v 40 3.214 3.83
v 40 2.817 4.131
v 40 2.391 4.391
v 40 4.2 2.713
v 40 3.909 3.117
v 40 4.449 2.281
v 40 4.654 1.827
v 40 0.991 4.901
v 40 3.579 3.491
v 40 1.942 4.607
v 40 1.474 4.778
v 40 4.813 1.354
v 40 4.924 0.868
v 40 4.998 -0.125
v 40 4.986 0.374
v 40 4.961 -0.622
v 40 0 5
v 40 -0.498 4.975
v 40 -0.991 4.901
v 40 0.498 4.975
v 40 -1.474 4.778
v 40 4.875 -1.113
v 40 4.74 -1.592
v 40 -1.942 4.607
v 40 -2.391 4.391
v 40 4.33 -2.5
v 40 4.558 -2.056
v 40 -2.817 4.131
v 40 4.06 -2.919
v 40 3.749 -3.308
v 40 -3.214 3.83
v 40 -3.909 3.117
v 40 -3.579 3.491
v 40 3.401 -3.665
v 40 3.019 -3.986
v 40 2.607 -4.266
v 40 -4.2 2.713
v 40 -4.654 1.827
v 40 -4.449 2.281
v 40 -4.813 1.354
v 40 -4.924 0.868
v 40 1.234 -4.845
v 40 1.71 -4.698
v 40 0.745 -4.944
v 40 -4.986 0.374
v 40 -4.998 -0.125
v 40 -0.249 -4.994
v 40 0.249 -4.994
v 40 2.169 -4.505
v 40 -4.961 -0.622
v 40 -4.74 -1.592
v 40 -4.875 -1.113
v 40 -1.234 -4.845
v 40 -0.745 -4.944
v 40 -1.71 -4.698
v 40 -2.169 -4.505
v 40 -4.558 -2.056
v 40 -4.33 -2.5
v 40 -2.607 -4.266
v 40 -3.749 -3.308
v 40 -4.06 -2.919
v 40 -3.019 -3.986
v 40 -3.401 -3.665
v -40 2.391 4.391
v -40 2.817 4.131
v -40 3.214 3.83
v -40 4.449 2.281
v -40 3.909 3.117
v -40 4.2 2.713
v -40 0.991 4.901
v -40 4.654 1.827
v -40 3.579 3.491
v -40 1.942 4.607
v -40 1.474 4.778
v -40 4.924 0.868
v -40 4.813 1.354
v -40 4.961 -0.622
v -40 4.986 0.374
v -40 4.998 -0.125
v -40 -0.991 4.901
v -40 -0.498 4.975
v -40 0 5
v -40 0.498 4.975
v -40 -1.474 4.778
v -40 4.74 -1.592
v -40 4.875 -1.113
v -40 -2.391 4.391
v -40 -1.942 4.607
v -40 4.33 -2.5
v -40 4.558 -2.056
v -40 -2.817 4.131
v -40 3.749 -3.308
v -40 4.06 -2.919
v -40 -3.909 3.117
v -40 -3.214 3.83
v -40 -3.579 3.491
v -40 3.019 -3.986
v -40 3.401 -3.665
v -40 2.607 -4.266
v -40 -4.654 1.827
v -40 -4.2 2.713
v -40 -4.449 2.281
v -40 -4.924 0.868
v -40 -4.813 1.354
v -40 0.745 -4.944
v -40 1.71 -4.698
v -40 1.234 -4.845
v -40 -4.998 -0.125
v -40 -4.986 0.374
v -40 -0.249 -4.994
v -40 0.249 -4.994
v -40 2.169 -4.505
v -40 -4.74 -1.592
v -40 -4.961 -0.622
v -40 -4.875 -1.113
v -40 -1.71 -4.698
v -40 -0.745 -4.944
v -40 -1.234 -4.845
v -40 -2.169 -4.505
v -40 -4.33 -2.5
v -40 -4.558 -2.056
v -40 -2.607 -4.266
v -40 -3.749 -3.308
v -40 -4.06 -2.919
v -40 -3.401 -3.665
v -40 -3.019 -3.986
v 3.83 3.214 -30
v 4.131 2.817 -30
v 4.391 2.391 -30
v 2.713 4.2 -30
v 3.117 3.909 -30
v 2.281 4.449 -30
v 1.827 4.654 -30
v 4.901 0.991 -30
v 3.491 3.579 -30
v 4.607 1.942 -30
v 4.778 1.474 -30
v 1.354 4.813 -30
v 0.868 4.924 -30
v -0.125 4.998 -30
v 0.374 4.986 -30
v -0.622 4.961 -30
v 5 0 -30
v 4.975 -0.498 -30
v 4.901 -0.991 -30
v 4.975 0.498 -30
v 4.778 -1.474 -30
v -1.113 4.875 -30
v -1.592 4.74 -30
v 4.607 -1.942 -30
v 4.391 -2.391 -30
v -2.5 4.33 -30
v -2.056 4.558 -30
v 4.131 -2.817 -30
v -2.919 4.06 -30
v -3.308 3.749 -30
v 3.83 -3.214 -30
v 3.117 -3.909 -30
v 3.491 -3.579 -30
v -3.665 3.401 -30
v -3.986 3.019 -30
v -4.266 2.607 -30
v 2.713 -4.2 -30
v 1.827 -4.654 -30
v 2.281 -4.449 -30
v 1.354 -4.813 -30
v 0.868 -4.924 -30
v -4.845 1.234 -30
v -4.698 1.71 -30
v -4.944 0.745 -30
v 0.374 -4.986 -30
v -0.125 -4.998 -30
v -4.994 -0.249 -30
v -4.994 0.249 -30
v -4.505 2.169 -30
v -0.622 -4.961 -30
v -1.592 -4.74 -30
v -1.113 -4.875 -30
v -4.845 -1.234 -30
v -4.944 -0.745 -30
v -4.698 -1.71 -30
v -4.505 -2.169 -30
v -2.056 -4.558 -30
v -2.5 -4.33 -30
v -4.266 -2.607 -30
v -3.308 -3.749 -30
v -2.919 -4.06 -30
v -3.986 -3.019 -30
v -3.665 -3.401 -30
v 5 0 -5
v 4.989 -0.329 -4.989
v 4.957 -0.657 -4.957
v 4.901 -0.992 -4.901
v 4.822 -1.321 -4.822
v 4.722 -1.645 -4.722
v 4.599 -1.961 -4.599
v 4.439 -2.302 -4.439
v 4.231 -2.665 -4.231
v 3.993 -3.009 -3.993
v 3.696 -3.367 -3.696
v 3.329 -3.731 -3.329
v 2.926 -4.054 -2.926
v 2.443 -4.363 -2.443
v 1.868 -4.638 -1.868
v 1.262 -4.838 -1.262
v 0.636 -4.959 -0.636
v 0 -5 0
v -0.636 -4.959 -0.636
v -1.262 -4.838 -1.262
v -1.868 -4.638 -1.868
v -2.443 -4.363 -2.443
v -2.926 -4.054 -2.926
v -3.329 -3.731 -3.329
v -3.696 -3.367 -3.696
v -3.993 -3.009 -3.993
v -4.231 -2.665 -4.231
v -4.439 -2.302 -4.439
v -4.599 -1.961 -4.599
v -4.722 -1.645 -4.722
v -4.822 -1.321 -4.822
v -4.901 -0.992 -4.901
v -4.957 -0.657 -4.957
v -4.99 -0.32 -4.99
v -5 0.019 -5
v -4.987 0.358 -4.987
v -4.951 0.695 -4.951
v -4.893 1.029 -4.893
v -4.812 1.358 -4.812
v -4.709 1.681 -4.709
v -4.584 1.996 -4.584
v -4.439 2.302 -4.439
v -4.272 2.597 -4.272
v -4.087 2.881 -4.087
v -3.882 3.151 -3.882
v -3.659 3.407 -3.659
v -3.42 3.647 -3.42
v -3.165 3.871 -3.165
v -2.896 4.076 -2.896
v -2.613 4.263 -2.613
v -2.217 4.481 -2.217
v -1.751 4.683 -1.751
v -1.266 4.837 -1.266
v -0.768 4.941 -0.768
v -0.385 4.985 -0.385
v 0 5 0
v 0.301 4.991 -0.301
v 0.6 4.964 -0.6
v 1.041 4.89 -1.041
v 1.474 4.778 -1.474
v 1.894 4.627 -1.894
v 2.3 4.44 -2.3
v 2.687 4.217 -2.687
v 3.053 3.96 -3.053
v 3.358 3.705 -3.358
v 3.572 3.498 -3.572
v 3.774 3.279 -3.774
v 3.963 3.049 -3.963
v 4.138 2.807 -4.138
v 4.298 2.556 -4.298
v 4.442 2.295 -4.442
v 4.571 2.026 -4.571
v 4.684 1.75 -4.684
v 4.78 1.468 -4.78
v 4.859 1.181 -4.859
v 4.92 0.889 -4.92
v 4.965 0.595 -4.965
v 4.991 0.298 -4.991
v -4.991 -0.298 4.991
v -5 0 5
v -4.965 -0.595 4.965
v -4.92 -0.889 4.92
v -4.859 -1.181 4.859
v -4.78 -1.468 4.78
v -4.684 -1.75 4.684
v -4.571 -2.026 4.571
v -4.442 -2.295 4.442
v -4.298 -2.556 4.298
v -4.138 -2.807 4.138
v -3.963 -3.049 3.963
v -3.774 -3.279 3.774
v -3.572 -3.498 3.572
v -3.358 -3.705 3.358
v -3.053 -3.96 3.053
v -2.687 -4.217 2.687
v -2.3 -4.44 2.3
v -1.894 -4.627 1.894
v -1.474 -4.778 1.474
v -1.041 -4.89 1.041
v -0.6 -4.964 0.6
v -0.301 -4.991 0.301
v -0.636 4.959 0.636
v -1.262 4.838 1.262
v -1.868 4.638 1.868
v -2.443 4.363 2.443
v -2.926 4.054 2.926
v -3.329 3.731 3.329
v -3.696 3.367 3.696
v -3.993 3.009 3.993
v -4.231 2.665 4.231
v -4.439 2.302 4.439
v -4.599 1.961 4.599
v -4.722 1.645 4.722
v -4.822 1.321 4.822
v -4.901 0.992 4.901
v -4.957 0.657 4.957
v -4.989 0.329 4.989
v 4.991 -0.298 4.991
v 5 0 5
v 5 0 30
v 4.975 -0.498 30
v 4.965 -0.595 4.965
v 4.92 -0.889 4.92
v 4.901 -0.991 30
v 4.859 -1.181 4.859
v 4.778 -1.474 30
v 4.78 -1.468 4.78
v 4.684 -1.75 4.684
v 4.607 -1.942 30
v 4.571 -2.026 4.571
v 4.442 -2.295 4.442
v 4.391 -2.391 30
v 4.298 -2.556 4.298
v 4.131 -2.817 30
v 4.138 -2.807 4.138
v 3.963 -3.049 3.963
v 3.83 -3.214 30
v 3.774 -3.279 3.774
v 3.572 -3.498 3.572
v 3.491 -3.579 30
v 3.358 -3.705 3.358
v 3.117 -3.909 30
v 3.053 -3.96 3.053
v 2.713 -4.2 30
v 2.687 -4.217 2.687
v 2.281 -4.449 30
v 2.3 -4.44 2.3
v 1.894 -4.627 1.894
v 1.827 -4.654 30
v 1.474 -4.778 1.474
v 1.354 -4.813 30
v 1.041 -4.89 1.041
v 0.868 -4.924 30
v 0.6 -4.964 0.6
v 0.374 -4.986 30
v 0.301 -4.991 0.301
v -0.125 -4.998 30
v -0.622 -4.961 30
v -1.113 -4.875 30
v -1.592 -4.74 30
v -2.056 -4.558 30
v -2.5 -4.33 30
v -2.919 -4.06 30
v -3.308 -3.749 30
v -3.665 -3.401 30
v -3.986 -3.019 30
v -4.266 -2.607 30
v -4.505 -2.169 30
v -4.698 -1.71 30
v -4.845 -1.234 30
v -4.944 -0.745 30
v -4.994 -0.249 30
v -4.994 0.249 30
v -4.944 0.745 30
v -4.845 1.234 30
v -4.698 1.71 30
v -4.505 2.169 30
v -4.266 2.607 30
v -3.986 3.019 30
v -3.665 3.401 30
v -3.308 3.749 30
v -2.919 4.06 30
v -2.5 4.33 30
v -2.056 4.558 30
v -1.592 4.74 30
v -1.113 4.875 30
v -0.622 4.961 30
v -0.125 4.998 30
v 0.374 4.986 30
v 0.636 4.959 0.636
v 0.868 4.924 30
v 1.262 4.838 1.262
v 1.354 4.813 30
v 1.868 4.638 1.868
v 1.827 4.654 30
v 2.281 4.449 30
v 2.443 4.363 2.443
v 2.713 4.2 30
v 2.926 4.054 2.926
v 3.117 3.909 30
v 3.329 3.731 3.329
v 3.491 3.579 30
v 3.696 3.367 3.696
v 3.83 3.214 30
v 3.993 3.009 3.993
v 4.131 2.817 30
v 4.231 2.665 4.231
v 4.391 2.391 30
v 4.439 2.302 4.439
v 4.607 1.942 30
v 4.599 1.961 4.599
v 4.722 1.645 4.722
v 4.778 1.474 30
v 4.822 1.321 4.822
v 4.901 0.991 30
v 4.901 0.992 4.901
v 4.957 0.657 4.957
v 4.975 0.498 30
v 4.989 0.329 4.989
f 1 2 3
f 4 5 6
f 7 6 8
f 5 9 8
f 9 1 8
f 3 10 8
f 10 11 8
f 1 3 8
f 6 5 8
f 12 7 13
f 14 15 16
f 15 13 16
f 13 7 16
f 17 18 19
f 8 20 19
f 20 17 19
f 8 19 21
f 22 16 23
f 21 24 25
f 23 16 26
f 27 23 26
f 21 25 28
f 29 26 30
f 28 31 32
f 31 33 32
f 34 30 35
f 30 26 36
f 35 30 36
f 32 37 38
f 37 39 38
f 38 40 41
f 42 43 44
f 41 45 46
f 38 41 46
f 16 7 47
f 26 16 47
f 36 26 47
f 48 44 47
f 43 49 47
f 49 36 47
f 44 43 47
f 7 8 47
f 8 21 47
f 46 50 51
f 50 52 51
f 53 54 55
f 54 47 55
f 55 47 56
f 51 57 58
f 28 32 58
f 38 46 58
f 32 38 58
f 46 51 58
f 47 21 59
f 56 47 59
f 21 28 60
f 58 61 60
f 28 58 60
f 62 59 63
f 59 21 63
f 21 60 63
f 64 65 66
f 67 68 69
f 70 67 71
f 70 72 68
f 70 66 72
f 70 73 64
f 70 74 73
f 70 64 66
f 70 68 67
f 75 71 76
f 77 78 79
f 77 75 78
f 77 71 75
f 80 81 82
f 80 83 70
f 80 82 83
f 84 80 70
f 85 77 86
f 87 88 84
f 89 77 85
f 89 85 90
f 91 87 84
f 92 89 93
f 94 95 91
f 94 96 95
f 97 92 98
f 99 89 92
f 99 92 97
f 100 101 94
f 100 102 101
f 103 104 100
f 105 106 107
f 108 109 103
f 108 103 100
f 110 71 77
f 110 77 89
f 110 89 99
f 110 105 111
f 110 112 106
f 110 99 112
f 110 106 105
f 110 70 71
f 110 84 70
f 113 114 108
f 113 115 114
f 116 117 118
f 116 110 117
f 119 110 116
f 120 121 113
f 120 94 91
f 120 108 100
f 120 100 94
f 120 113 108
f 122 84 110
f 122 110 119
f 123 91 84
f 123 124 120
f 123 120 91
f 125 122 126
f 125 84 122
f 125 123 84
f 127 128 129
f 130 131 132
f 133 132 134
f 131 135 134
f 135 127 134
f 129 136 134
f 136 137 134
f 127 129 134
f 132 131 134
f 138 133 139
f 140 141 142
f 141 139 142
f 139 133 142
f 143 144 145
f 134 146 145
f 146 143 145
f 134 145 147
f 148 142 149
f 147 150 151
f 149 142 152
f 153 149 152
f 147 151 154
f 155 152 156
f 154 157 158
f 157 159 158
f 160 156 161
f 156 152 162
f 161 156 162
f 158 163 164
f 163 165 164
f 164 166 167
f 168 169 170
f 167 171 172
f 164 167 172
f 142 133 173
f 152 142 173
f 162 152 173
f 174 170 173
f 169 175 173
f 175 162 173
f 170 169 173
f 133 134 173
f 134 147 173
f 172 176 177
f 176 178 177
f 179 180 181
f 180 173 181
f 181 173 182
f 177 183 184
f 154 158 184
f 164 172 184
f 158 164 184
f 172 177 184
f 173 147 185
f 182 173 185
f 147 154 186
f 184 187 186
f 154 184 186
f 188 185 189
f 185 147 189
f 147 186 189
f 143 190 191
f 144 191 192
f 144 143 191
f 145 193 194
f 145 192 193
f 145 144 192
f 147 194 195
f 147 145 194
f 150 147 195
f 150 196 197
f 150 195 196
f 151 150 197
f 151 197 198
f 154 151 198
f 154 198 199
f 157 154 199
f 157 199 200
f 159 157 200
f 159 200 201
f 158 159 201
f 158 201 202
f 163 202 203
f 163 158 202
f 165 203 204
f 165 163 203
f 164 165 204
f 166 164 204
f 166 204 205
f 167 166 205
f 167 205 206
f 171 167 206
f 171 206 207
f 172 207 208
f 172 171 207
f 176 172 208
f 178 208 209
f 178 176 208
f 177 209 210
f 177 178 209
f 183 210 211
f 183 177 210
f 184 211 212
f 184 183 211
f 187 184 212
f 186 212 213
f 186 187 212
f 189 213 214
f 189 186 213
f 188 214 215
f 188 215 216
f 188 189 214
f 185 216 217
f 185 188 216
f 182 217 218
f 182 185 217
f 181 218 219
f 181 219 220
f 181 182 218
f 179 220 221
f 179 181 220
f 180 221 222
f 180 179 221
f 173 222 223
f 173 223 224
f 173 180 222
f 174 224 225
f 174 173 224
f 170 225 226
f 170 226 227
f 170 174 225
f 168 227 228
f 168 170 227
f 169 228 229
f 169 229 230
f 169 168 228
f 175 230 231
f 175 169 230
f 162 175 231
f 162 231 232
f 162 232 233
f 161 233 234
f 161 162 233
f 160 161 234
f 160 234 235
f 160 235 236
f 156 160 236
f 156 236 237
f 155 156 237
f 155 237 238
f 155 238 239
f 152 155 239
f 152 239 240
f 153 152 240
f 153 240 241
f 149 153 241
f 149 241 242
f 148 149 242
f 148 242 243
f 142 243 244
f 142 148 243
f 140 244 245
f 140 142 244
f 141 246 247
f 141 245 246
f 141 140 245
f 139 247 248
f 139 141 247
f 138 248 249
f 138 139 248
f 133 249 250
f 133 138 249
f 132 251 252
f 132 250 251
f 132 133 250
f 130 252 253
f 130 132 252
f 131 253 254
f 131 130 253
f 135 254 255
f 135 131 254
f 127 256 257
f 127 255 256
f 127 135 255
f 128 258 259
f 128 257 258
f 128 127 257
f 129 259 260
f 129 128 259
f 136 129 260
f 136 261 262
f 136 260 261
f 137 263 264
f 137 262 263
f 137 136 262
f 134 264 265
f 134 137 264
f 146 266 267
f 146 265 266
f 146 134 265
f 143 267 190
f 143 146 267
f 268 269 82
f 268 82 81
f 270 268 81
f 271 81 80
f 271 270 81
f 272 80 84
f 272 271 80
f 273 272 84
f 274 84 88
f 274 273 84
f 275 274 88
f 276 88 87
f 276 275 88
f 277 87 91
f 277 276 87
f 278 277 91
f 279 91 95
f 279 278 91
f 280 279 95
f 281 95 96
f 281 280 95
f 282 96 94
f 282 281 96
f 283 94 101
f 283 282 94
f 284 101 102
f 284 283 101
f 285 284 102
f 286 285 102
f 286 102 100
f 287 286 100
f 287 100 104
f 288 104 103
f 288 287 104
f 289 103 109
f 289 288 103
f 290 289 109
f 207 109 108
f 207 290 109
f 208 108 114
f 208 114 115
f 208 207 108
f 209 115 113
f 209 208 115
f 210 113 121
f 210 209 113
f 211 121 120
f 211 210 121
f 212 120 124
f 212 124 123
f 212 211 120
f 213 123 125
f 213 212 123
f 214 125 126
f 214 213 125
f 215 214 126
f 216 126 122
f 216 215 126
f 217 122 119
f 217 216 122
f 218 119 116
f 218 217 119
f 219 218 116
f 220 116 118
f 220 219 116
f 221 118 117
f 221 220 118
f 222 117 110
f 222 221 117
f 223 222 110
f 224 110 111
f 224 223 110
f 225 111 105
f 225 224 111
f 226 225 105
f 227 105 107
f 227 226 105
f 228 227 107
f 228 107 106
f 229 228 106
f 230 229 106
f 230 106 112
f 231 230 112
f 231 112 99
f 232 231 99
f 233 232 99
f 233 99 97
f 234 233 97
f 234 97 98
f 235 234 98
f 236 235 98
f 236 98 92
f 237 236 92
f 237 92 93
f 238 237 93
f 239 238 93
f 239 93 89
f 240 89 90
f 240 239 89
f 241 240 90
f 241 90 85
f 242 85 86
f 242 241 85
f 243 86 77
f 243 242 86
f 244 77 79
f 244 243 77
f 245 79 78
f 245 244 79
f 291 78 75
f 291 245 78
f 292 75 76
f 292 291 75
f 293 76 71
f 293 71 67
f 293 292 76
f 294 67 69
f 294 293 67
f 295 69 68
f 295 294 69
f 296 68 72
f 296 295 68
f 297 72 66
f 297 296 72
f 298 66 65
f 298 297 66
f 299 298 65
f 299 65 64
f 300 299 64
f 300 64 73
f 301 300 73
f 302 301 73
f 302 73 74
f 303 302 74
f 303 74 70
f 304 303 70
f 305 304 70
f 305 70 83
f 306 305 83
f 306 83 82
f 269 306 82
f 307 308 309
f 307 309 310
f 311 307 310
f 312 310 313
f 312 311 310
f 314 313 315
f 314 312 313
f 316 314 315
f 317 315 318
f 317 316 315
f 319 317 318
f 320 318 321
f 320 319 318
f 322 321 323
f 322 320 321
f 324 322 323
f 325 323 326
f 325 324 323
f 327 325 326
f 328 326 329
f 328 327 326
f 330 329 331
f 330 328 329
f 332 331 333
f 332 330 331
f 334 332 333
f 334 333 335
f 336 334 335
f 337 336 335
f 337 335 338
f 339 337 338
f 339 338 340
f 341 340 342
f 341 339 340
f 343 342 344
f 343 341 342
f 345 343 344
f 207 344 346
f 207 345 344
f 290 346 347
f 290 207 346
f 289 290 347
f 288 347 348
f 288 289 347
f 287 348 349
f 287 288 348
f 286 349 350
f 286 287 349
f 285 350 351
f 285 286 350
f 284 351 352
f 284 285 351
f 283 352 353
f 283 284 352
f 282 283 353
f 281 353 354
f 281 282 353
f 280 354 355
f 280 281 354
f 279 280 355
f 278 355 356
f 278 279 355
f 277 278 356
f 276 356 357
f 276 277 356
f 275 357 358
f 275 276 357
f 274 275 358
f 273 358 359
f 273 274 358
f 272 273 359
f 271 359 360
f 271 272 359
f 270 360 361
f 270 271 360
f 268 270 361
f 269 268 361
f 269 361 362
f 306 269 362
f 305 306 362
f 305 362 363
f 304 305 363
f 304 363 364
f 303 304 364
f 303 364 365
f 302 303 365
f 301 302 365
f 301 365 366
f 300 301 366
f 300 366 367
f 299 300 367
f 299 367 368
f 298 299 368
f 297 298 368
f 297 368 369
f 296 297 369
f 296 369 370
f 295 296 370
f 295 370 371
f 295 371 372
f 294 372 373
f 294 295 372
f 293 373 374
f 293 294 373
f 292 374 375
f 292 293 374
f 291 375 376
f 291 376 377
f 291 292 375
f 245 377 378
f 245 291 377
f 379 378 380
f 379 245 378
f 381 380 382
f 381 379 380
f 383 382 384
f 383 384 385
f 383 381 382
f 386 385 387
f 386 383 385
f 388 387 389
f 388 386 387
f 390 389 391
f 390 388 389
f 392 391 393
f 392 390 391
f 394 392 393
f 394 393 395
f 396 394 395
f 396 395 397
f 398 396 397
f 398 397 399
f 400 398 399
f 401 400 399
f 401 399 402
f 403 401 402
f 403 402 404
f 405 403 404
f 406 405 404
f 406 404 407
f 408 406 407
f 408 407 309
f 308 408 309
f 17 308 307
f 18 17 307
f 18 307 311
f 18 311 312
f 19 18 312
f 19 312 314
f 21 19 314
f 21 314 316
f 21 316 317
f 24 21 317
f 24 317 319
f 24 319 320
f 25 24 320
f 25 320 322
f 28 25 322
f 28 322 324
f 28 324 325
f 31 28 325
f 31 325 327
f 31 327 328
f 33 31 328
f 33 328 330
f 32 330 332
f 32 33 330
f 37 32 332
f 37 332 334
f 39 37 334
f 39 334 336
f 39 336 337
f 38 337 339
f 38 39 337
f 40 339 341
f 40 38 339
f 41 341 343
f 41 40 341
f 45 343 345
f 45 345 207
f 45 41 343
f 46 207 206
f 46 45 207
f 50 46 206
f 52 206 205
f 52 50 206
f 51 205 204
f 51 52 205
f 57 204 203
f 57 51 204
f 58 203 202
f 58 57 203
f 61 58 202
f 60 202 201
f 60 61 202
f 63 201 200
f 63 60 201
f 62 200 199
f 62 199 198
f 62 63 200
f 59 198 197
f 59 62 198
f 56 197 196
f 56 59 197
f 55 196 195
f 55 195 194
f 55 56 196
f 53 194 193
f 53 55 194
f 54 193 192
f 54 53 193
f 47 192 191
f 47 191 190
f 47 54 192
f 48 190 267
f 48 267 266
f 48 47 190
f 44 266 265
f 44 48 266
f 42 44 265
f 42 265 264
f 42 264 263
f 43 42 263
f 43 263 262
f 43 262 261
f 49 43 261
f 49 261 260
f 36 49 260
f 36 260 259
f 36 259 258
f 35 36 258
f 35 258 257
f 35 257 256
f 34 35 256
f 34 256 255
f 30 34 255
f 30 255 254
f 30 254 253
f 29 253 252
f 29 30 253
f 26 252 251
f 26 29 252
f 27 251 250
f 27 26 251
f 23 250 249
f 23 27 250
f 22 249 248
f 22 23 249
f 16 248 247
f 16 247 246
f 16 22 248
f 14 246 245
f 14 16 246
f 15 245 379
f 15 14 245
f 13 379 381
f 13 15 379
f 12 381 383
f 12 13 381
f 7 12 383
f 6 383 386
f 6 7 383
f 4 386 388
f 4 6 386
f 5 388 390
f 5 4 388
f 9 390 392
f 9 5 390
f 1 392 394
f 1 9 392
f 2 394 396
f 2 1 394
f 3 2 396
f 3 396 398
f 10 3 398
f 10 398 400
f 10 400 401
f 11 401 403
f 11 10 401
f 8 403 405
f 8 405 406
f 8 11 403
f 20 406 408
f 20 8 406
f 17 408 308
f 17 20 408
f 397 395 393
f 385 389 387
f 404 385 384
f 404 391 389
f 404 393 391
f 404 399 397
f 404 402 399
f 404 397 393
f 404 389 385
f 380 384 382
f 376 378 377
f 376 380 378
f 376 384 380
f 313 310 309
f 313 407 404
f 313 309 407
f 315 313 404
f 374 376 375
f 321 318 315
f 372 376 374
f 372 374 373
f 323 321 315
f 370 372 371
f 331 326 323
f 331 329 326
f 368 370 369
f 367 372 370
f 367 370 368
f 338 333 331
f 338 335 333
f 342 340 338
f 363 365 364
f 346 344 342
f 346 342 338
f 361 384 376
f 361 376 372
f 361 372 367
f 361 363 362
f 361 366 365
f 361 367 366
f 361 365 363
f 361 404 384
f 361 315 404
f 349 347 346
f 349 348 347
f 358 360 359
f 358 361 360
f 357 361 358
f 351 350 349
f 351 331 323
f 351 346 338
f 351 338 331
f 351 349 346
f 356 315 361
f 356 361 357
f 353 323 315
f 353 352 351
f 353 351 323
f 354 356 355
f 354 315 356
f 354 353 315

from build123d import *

# Parameters (mm, degrees)
SKETCH_1_W = 80
SKETCH_1_H = 5
SKETCH_2_W = 5
SKETCH_2_H = 60


with BuildPart() as part:
    # 草图1 → 旋转1 (revolve)
    with BuildSketch(Plane.XY, mode=Mode.PRIVATE) as revolve_1_sk:
        with Locations((0, 2.5)):
            Rectangle(SKETCH_1_W, SKETCH_1_H)
    revolve(revolve_1_sk.sketch.rotate(Axis((-40, 0, 0), (1, 0, 0)), 90), axis=Axis((-40, 0, 0), (1, 0, 0)))

    # 草图2 → 旋转2 (revolve)
    with BuildSketch(Plane(origin=(0, 0, 0), x_dir=(1, 0, 0), z_dir=(0, 1, 0))):
        with Locations((2.5, 0)):
            Rectangle(SKETCH_2_W, SKETCH_2_H)
    revolve(axis=Axis((0, 0, 30), (0, 0, -1)))


solid = part.part
